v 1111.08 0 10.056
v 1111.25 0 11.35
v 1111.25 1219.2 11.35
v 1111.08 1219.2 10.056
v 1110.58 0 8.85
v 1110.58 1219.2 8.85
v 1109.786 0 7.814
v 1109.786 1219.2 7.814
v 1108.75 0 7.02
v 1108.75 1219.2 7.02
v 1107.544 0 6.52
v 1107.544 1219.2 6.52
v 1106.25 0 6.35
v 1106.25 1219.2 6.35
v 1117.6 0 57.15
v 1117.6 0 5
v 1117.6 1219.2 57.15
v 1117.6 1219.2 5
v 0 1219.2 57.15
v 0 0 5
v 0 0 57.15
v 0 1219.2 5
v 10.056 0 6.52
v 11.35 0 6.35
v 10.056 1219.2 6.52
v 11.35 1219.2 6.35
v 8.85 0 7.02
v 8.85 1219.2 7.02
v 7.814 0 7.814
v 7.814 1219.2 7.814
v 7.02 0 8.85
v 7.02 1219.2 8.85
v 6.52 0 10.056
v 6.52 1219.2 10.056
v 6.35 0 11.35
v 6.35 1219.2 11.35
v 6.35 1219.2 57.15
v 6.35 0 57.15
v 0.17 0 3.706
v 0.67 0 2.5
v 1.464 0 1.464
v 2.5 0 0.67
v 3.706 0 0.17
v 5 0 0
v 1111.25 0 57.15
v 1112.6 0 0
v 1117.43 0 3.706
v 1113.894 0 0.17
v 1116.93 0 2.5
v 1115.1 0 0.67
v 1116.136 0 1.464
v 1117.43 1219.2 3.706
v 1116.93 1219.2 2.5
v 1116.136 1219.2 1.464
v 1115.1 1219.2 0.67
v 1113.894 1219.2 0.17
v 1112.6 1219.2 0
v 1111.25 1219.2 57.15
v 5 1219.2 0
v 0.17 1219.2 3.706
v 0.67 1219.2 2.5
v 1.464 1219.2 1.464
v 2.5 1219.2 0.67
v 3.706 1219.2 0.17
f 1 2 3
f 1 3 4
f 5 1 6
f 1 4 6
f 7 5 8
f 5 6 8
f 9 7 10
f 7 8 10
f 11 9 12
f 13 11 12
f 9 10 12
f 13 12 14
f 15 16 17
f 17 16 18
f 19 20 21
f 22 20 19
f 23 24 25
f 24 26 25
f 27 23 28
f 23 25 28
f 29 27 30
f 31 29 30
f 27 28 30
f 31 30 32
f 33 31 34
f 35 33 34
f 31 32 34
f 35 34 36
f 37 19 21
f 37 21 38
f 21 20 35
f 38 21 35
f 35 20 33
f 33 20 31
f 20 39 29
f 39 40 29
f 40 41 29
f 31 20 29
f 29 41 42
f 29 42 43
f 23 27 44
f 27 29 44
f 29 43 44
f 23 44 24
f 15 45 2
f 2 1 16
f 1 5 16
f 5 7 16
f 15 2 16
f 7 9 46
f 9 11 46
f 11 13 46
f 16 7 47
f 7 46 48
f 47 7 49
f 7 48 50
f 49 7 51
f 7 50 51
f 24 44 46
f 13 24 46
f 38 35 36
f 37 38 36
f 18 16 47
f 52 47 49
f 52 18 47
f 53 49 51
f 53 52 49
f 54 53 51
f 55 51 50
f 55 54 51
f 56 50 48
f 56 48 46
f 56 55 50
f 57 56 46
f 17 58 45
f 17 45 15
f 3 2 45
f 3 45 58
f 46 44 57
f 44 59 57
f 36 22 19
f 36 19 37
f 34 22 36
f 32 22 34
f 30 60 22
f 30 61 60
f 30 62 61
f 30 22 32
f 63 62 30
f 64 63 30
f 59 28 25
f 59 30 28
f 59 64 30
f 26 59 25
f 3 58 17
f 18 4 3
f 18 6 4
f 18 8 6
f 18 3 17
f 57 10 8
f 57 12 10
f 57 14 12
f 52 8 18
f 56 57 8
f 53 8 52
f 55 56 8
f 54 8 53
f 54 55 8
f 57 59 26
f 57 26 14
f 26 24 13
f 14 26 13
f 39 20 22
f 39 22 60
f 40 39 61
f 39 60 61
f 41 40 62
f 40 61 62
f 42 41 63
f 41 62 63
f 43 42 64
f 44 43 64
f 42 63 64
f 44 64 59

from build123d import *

# Parameters (mm, degrees)
SKETCH1_W           = 1117.6
SKETCH1_H           = 1219.2
BOSS_EXTRUDE1_DEPTH = 6.35
SKETCH2_W           = 6.35
SKETCH2_H           = 1219.2
BOSS_EXTRUDE2_DEPTH = 50.8
FILLET1_R           = 5


with BuildPart() as part:
    # Sketch1 → Boss-Extrude1 (new body)
    with BuildSketch(Plane.XY):
        with Locations((558.8, 609.6)):
            Rectangle(SKETCH1_W, SKETCH1_H)
    extrude(amount=BOSS_EXTRUDE1_DEPTH)

    # Sketch2 → Boss-Extrude2 (add)
    with BuildSketch(Plane.XY.offset(6.35)):
        with Locations((3.175, 609.6)):
            Rectangle(SKETCH2_W, SKETCH2_H)
        with Locations((1114.425, 609.6)):
            Rectangle(SKETCH2_W, SKETCH2_H)
    extrude(amount=BOSS_EXTRUDE2_DEPTH)

    # Fillet1
    fillet1_edges = [part.edges().sort_by_distance(p)[0] for p in [
        (6.35, 609.6, 6.35),
        (1111.25, 609.6, 6.35),
        (1117.6, 609.6, 0),
        (0, 609.6, 0),
    ]]
    fillet(fillet1_edges, radius=FILLET1_R)


solid = part.part
